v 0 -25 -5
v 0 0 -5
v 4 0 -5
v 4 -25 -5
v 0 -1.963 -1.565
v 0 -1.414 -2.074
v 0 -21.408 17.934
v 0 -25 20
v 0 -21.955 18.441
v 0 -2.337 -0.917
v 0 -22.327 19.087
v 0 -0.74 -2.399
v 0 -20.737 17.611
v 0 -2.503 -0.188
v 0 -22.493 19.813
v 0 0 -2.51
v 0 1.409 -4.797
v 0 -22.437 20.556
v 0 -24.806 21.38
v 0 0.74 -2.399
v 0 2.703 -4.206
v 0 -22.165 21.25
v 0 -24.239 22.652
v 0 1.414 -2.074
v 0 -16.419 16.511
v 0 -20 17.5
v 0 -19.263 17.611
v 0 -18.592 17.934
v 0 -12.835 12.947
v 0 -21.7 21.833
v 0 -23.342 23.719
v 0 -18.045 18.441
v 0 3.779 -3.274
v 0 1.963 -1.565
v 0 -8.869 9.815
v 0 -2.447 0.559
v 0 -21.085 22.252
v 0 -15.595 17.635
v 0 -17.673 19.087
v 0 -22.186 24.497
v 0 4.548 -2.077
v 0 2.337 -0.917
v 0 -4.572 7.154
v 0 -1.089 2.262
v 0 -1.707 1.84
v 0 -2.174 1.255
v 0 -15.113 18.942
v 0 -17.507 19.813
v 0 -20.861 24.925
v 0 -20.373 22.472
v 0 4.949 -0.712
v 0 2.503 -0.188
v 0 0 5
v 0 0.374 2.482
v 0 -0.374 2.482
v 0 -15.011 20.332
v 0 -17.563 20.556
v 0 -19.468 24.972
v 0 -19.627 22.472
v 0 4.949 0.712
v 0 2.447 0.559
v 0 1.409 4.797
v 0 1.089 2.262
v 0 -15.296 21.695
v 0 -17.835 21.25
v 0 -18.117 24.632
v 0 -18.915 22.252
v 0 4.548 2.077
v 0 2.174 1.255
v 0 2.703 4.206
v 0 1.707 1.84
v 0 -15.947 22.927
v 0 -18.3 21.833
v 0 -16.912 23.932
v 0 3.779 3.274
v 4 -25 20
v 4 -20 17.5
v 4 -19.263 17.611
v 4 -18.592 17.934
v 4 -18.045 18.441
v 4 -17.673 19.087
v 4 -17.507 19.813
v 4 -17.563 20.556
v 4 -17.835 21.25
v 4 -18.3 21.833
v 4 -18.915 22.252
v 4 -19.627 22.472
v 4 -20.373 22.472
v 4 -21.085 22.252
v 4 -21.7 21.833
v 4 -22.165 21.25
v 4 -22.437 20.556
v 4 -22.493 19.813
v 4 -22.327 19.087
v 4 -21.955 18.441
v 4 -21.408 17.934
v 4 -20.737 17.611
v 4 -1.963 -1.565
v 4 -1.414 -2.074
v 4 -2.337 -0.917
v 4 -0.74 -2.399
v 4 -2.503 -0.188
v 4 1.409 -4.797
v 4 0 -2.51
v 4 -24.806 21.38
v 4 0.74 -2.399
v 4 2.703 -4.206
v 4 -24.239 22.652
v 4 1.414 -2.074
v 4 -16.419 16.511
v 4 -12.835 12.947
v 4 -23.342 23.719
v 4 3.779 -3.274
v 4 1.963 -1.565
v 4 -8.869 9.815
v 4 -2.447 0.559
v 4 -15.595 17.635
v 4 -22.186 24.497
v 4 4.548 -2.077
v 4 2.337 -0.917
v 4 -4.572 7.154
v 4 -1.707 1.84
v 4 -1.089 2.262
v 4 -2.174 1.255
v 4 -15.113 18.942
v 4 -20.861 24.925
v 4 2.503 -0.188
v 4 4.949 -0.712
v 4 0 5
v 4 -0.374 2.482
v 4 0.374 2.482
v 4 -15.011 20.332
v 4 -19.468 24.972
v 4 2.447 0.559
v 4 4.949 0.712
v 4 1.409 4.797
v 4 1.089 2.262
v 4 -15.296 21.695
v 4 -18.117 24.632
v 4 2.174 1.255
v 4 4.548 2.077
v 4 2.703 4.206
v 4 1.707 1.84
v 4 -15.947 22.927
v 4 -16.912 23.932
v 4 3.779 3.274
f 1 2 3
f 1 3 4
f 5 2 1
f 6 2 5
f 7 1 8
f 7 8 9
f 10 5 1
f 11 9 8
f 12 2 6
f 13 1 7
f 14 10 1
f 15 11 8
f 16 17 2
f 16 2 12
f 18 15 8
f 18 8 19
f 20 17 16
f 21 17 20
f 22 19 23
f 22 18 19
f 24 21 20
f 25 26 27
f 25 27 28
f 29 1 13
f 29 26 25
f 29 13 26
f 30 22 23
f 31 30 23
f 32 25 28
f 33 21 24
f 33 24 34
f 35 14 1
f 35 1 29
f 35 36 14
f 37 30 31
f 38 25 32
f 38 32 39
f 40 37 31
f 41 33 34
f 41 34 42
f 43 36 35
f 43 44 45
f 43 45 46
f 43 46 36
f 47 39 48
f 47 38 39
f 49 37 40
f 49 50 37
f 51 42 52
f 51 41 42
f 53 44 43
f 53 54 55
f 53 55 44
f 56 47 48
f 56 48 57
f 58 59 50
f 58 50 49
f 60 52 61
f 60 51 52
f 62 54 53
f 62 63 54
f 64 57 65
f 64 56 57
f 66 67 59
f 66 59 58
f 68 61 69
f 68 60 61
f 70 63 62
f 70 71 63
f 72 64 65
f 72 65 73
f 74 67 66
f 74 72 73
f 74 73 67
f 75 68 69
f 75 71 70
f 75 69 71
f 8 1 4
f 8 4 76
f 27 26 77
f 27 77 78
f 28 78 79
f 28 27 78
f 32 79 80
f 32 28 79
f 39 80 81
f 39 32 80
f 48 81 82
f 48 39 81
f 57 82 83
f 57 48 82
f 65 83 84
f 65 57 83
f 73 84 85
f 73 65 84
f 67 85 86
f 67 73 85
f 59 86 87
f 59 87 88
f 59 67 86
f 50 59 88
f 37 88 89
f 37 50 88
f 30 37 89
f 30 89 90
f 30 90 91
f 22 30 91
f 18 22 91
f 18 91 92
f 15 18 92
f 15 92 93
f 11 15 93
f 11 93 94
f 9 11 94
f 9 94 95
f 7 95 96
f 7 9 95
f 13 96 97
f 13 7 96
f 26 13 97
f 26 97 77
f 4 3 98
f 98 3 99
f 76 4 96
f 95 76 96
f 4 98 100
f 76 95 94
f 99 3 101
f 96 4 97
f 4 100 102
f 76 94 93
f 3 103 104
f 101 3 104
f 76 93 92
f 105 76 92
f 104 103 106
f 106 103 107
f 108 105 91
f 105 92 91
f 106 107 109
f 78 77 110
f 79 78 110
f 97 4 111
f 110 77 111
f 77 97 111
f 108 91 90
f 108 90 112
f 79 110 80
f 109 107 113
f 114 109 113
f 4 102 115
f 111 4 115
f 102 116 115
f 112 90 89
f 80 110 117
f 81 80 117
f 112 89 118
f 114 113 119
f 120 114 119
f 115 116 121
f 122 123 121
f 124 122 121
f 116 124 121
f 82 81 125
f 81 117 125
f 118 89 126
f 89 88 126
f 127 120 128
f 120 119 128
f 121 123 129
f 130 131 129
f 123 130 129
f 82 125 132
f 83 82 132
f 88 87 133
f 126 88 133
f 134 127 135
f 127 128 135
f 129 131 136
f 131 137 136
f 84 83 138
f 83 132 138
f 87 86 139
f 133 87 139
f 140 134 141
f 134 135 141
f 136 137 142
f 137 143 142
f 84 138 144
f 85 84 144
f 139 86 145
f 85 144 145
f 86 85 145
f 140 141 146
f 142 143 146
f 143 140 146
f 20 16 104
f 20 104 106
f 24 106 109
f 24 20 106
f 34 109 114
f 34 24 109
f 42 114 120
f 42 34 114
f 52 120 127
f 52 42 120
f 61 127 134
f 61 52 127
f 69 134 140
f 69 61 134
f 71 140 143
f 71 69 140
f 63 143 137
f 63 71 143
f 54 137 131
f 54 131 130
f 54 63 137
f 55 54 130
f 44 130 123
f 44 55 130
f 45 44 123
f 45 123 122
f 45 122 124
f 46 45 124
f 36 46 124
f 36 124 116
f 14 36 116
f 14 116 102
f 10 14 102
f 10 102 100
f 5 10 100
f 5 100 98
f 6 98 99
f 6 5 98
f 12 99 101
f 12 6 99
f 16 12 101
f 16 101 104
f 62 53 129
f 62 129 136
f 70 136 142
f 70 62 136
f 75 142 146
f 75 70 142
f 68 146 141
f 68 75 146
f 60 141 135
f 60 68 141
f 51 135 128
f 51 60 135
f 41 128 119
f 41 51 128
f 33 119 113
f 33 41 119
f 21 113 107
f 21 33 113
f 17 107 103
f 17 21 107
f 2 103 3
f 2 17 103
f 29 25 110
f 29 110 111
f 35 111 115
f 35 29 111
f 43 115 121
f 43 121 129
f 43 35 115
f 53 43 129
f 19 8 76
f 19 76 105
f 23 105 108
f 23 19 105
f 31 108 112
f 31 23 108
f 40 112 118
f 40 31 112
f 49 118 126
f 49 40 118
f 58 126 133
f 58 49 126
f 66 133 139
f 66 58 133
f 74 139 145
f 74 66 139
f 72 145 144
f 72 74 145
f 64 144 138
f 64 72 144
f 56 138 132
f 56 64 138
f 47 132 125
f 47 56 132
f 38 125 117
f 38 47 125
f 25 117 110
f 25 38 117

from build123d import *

# Parameters (mm, degrees)
CROQUIS3_R              = 2.5103265
CROQUIS3_R_2            = 2.5
SALIENTE_EXTRUIR1_DEPTH = 4


with BuildPart() as part:
    # Croquis3 → Saliente-Extruir1 (new body)
    with BuildSketch(Plane(origin=(0, 0, 0), x_dir=(0, 0, -1), z_dir=(1, 0, 0))):
        with BuildLine():
            Line((5, 0), (5, -25))
            Line((5, -25), (-20, -25))
            ThreePointArc((-20, -25), (-24.631788644, -18.116775648), (-16.510921132, -16.418613585))
            ThreePointArc((-16.510921132, -16.418613585), (-9.814593541, -8.868938988), (-5, 0))
            ThreePointArc((-5, 0), (0, 5), (5, 0))
        make_face()
        Circle(CROQUIS3_R, mode=Mode.SUBTRACT)
        with Locations((-20, -20)):
            Circle(CROQUIS3_R_2, mode=Mode.SUBTRACT)
    extrude(amount=SALIENTE_EXTRUIR1_DEPTH)


solid = part.part
